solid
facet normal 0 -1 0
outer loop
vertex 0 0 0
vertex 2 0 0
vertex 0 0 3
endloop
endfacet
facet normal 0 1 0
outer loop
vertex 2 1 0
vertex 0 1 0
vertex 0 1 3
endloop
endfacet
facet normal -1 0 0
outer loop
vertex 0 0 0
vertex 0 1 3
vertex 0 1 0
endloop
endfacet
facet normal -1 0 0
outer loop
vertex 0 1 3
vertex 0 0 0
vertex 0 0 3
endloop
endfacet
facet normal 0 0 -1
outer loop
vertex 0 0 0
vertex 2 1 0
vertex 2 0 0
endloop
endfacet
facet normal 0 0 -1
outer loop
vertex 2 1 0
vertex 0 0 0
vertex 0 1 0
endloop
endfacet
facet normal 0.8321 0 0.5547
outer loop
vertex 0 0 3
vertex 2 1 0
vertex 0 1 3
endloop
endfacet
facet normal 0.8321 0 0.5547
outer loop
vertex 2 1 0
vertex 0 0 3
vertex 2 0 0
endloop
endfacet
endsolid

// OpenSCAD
//Draw a prism based on a 
//right angled triangle
//l - length of prism
//w - width of triangle
//h - height of triangle
//From https://github.com/orionrobots/openscad_parts_library/blob/master/prism.scad
module prism(l, w, h) {
       polyhedron(points=[
               [0,0,h],           // 0    front top corner
               [0,0,0],[w,0,0],   // 1, 2 front left & right bottom corners
               [0,l,h],           // 3    back top corner
               [0,l,0],[w,l,0]    // 4, 5 back left & right bottom corners
       ], faces=[ // points for all faces must be ordered clockwise when looking in
               [0,2,1],    // top face
               [3,4,5],    // base face
               [0,1,4,3],  // h face
               [1,2,5,4],  // w face
               [0,3,5,2],  // hypotenuse face
       ]);
}

prism(1,2,3);
